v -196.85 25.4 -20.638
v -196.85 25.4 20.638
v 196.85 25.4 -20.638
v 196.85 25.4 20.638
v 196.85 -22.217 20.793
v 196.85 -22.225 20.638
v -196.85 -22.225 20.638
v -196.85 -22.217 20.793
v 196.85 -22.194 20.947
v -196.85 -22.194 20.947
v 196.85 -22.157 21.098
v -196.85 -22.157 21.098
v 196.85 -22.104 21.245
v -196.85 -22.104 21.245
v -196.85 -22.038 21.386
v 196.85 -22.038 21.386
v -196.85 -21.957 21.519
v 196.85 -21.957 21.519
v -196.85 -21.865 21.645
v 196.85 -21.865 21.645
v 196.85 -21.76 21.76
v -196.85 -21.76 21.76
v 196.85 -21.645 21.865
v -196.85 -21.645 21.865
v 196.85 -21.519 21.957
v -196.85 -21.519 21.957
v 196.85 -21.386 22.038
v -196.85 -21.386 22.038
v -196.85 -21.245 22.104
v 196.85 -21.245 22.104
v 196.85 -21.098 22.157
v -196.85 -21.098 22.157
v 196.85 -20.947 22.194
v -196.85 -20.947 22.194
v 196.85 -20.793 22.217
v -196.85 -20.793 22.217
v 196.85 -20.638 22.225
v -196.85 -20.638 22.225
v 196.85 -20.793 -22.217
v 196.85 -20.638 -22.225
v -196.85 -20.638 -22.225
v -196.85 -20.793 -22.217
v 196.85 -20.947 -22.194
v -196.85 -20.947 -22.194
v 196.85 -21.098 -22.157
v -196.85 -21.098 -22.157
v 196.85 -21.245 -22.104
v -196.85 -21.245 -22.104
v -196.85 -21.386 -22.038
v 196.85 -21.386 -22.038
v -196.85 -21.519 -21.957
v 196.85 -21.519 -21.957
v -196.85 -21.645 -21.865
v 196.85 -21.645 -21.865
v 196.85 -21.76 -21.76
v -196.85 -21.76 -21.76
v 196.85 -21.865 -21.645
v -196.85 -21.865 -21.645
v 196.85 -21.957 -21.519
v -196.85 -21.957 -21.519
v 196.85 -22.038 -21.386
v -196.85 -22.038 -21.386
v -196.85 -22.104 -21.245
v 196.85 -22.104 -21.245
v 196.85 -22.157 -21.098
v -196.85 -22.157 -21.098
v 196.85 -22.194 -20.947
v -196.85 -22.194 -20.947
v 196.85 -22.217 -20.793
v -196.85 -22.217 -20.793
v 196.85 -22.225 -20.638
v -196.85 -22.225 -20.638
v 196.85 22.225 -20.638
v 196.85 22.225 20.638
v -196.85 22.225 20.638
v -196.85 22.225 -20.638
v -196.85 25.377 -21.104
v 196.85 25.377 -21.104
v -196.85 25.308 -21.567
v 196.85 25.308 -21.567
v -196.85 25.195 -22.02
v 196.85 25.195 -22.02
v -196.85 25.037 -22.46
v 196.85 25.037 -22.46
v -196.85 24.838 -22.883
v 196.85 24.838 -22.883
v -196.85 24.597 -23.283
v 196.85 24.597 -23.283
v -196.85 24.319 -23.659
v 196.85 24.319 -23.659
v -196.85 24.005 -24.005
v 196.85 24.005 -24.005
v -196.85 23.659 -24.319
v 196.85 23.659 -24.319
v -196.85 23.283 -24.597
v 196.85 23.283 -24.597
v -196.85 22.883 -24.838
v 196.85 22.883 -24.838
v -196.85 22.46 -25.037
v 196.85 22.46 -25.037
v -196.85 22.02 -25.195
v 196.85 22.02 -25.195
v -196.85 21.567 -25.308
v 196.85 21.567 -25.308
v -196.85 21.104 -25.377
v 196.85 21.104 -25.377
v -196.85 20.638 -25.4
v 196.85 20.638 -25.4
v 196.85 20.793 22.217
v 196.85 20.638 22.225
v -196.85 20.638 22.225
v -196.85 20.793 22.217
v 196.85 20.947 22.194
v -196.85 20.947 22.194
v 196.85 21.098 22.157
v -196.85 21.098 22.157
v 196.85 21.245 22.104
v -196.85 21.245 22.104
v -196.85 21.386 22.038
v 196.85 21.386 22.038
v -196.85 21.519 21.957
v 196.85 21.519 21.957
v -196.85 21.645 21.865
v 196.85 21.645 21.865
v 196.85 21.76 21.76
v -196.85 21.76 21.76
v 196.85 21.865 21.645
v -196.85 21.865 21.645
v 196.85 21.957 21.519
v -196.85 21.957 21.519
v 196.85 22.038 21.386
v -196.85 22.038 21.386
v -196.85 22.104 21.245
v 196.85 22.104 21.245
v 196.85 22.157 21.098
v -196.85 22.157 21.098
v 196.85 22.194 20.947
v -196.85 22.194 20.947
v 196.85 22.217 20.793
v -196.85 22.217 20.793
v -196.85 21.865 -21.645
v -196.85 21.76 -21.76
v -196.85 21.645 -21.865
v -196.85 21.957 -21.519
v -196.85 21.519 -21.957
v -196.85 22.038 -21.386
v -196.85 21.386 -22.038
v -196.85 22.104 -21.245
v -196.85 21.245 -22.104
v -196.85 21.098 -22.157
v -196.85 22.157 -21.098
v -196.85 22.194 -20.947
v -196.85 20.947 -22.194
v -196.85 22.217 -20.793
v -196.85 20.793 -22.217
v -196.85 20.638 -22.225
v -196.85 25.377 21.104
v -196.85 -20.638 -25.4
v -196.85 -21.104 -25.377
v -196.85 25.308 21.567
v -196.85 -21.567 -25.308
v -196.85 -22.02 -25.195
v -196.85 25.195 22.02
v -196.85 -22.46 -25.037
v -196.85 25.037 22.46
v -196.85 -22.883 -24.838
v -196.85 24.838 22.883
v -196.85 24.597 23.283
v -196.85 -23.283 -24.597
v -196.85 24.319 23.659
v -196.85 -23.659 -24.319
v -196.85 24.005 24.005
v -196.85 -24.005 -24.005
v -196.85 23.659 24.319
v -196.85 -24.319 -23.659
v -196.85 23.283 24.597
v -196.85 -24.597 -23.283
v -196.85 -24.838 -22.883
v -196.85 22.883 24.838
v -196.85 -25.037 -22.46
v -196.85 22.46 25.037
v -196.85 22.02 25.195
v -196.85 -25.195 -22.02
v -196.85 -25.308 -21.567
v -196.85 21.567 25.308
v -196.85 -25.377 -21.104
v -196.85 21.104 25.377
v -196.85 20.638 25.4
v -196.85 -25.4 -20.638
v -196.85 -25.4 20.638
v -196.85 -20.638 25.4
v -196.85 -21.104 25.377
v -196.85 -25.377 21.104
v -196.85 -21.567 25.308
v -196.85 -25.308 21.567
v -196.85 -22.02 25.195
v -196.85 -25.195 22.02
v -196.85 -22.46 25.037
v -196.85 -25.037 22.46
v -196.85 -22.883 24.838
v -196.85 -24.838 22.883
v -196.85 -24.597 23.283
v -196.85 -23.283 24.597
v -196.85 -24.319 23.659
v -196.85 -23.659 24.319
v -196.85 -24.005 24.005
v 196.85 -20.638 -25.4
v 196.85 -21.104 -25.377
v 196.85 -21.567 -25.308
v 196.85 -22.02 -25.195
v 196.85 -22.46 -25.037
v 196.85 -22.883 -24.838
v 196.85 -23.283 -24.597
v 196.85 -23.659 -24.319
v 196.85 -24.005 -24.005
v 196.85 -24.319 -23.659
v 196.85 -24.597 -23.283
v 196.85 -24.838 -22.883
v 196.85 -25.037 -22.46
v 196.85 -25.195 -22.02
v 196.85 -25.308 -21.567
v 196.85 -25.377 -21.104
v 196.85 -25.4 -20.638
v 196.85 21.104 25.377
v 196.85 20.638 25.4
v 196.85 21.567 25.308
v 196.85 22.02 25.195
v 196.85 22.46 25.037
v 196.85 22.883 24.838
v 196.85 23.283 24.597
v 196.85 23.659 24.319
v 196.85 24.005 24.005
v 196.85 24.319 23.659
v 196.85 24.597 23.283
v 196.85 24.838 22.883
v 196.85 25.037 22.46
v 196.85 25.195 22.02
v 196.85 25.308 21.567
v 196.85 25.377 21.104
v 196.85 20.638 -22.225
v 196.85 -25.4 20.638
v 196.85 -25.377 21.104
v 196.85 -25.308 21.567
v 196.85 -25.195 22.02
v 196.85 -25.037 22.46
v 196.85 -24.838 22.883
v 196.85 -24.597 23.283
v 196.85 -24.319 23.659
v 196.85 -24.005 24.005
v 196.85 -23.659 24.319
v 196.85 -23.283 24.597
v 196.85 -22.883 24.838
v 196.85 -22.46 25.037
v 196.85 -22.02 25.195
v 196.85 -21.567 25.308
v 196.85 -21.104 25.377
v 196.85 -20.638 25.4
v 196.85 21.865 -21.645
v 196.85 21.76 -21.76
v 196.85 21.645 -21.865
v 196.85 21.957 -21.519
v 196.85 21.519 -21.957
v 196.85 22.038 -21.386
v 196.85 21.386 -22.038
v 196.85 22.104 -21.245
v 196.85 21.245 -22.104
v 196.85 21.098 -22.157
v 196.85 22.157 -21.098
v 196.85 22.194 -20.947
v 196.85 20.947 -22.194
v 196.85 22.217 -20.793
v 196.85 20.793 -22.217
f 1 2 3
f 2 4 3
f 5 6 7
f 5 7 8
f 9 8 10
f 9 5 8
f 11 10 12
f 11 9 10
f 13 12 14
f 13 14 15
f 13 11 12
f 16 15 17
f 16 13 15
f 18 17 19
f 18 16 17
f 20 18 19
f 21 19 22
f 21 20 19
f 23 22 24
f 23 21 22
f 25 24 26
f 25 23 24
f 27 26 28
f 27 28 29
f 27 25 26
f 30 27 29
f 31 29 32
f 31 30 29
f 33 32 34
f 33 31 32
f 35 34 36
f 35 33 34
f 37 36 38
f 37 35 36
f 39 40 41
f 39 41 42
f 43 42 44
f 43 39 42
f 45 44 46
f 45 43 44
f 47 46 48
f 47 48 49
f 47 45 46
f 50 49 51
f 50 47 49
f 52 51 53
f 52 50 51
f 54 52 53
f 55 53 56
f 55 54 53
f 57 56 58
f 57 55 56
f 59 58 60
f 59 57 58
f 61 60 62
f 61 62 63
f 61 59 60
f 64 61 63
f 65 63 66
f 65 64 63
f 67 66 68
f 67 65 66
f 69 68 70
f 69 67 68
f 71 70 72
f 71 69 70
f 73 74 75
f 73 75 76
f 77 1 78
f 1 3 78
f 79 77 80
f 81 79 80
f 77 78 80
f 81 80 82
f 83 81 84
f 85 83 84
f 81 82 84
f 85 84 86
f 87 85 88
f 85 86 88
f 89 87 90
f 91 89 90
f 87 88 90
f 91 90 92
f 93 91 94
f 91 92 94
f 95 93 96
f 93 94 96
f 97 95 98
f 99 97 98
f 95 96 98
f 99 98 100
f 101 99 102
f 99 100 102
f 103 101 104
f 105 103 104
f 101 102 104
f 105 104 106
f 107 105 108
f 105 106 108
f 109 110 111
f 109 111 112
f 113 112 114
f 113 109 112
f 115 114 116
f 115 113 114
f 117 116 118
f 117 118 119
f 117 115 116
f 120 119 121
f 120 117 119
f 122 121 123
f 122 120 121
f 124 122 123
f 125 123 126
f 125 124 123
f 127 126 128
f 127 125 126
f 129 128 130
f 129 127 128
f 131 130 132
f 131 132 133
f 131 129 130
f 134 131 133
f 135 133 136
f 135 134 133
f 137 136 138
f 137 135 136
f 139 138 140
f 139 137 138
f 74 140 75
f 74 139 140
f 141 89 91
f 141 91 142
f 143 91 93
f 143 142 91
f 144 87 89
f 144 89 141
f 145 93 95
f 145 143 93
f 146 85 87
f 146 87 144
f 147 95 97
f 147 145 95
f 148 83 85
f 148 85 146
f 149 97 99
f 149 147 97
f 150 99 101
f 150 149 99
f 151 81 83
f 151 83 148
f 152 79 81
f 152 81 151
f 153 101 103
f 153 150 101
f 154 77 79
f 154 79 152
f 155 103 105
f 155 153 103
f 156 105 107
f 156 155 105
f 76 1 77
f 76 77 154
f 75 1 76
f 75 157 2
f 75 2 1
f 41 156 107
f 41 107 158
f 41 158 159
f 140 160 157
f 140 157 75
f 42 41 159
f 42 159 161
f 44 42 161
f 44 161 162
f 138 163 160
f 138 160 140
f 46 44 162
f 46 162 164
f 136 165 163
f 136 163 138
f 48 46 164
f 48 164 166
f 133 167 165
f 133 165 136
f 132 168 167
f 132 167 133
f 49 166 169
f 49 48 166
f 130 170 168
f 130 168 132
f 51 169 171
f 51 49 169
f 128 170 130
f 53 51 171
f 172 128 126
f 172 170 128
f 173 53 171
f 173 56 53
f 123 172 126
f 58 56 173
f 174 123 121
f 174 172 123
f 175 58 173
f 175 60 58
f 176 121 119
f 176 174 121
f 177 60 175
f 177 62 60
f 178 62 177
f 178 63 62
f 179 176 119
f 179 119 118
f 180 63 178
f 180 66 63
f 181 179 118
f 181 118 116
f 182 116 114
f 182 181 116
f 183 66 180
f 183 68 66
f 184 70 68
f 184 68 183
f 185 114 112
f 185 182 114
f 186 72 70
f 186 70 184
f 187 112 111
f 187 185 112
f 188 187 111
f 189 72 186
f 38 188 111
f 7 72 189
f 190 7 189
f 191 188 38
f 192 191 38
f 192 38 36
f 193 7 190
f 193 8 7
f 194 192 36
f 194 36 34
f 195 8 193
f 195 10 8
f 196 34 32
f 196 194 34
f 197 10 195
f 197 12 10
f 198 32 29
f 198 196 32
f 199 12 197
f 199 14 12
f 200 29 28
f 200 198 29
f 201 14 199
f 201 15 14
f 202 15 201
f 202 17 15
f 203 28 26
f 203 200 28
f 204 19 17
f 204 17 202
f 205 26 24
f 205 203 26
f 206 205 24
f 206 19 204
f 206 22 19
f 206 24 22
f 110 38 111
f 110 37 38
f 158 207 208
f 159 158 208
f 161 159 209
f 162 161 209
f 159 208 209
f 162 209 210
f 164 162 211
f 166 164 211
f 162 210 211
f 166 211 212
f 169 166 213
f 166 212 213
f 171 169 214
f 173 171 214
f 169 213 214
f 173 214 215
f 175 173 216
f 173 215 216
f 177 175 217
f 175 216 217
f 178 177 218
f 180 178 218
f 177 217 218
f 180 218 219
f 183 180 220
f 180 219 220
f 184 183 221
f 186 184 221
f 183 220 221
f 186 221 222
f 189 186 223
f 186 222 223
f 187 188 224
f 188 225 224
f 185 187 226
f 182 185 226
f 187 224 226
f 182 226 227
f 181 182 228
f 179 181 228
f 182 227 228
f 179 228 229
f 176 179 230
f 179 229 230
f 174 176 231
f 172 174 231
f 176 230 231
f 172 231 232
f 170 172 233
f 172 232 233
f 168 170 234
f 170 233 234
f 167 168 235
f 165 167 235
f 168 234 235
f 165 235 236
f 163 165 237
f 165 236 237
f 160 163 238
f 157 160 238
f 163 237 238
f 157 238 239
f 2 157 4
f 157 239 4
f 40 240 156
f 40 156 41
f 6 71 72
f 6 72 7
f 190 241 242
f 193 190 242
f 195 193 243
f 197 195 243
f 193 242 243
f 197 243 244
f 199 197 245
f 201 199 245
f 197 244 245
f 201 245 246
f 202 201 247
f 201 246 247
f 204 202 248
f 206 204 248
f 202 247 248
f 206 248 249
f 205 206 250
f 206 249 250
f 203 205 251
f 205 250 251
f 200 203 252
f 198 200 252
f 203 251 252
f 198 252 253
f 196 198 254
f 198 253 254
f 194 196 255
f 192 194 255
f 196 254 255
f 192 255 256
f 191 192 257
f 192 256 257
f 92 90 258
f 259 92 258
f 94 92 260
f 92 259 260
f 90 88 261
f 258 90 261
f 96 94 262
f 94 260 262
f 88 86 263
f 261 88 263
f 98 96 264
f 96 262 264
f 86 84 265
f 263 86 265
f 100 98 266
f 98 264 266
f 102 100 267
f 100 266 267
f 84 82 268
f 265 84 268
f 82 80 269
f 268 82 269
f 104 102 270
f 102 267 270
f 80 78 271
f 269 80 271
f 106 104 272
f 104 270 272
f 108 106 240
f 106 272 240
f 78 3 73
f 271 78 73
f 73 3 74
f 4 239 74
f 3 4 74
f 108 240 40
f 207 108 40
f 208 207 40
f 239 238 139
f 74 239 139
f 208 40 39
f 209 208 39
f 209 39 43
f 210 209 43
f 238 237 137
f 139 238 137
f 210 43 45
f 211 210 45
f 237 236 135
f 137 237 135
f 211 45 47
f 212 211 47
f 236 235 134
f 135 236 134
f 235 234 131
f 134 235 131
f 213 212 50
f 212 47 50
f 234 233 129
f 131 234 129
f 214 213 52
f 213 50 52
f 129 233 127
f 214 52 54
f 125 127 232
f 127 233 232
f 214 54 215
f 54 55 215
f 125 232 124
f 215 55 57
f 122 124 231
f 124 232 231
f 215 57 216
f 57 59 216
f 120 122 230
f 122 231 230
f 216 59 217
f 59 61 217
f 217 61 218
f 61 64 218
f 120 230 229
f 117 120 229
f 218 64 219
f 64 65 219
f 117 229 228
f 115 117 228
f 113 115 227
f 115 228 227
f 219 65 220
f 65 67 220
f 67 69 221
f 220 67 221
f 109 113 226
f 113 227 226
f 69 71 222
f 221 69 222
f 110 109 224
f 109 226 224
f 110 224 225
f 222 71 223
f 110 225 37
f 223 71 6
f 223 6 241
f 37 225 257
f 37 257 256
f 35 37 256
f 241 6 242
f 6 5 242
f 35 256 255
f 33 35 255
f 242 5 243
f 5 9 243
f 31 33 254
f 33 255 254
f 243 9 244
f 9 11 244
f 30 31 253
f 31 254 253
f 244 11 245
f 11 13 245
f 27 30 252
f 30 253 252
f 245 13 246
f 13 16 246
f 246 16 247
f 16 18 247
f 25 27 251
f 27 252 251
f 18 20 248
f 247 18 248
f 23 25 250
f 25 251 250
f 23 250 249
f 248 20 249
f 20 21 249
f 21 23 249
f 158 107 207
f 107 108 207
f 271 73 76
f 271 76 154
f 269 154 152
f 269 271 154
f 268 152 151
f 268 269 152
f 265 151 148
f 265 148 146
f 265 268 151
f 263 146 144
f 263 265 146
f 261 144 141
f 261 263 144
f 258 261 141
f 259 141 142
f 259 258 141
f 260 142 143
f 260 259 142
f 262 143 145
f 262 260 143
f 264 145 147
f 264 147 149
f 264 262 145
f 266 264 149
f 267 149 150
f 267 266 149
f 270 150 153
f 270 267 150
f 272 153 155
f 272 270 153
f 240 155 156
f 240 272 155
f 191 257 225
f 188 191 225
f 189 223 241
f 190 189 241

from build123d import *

# Parameters (mm, degrees)
BOSS_EXTRUDE1_DEPTH = 196.85


with BuildPart() as part:
    # Sketch1 → Boss-Extrude1 (new body, symmetric)
    with BuildSketch(Plane.YZ):
        with BuildLine():
            Line((-20.6375, 25.4), (20.6375, 25.4))
            ThreePointArc((20.6375, 25.4), (24.005096045, 24.005096045), (25.4, 20.6375))
            Line((25.4, 20.6375), (25.4, -20.6375))
            ThreePointArc((25.4, -20.6375), (24.005096045, -24.005096045), (20.6375, -25.4))
            Line((20.6375, -25.4), (-20.6375, -25.4))
            ThreePointArc((-20.6375, -25.4), (-24.005096045, -24.005096045), (-25.4, -20.6375))
            Line((-25.4, -20.6375), (-25.4, 20.6375))
            ThreePointArc((-25.4, 20.6375), (-24.005096045, 24.005096045), (-20.6375, 25.4))
        make_face()
        with BuildLine():
            Line((-20.6375, 22.225), (20.6375, 22.225))
            ThreePointArc((20.6375, 22.225), (21.760032015, 21.760032015), (22.225, 20.6375))
            Line((22.225, 20.6375), (22.225, -20.6375))
            ThreePointArc((22.225, -20.6375), (21.760032015, -21.760032015), (20.6375, -22.225))
            Line((20.6375, -22.225), (-20.6375, -22.225))
            ThreePointArc((-20.6375, -22.225), (-21.760032015, -21.760032015), (-22.225, -20.6375))
            Line((-22.225, -20.6375), (-22.225, 20.6375))
            ThreePointArc((-22.225, 20.6375), (-21.760032015, 21.760032015), (-20.6375, 22.225))
        make_face(mode=Mode.SUBTRACT)
    extrude(amount=BOSS_EXTRUDE1_DEPTH, both=True)


solid = part.part
